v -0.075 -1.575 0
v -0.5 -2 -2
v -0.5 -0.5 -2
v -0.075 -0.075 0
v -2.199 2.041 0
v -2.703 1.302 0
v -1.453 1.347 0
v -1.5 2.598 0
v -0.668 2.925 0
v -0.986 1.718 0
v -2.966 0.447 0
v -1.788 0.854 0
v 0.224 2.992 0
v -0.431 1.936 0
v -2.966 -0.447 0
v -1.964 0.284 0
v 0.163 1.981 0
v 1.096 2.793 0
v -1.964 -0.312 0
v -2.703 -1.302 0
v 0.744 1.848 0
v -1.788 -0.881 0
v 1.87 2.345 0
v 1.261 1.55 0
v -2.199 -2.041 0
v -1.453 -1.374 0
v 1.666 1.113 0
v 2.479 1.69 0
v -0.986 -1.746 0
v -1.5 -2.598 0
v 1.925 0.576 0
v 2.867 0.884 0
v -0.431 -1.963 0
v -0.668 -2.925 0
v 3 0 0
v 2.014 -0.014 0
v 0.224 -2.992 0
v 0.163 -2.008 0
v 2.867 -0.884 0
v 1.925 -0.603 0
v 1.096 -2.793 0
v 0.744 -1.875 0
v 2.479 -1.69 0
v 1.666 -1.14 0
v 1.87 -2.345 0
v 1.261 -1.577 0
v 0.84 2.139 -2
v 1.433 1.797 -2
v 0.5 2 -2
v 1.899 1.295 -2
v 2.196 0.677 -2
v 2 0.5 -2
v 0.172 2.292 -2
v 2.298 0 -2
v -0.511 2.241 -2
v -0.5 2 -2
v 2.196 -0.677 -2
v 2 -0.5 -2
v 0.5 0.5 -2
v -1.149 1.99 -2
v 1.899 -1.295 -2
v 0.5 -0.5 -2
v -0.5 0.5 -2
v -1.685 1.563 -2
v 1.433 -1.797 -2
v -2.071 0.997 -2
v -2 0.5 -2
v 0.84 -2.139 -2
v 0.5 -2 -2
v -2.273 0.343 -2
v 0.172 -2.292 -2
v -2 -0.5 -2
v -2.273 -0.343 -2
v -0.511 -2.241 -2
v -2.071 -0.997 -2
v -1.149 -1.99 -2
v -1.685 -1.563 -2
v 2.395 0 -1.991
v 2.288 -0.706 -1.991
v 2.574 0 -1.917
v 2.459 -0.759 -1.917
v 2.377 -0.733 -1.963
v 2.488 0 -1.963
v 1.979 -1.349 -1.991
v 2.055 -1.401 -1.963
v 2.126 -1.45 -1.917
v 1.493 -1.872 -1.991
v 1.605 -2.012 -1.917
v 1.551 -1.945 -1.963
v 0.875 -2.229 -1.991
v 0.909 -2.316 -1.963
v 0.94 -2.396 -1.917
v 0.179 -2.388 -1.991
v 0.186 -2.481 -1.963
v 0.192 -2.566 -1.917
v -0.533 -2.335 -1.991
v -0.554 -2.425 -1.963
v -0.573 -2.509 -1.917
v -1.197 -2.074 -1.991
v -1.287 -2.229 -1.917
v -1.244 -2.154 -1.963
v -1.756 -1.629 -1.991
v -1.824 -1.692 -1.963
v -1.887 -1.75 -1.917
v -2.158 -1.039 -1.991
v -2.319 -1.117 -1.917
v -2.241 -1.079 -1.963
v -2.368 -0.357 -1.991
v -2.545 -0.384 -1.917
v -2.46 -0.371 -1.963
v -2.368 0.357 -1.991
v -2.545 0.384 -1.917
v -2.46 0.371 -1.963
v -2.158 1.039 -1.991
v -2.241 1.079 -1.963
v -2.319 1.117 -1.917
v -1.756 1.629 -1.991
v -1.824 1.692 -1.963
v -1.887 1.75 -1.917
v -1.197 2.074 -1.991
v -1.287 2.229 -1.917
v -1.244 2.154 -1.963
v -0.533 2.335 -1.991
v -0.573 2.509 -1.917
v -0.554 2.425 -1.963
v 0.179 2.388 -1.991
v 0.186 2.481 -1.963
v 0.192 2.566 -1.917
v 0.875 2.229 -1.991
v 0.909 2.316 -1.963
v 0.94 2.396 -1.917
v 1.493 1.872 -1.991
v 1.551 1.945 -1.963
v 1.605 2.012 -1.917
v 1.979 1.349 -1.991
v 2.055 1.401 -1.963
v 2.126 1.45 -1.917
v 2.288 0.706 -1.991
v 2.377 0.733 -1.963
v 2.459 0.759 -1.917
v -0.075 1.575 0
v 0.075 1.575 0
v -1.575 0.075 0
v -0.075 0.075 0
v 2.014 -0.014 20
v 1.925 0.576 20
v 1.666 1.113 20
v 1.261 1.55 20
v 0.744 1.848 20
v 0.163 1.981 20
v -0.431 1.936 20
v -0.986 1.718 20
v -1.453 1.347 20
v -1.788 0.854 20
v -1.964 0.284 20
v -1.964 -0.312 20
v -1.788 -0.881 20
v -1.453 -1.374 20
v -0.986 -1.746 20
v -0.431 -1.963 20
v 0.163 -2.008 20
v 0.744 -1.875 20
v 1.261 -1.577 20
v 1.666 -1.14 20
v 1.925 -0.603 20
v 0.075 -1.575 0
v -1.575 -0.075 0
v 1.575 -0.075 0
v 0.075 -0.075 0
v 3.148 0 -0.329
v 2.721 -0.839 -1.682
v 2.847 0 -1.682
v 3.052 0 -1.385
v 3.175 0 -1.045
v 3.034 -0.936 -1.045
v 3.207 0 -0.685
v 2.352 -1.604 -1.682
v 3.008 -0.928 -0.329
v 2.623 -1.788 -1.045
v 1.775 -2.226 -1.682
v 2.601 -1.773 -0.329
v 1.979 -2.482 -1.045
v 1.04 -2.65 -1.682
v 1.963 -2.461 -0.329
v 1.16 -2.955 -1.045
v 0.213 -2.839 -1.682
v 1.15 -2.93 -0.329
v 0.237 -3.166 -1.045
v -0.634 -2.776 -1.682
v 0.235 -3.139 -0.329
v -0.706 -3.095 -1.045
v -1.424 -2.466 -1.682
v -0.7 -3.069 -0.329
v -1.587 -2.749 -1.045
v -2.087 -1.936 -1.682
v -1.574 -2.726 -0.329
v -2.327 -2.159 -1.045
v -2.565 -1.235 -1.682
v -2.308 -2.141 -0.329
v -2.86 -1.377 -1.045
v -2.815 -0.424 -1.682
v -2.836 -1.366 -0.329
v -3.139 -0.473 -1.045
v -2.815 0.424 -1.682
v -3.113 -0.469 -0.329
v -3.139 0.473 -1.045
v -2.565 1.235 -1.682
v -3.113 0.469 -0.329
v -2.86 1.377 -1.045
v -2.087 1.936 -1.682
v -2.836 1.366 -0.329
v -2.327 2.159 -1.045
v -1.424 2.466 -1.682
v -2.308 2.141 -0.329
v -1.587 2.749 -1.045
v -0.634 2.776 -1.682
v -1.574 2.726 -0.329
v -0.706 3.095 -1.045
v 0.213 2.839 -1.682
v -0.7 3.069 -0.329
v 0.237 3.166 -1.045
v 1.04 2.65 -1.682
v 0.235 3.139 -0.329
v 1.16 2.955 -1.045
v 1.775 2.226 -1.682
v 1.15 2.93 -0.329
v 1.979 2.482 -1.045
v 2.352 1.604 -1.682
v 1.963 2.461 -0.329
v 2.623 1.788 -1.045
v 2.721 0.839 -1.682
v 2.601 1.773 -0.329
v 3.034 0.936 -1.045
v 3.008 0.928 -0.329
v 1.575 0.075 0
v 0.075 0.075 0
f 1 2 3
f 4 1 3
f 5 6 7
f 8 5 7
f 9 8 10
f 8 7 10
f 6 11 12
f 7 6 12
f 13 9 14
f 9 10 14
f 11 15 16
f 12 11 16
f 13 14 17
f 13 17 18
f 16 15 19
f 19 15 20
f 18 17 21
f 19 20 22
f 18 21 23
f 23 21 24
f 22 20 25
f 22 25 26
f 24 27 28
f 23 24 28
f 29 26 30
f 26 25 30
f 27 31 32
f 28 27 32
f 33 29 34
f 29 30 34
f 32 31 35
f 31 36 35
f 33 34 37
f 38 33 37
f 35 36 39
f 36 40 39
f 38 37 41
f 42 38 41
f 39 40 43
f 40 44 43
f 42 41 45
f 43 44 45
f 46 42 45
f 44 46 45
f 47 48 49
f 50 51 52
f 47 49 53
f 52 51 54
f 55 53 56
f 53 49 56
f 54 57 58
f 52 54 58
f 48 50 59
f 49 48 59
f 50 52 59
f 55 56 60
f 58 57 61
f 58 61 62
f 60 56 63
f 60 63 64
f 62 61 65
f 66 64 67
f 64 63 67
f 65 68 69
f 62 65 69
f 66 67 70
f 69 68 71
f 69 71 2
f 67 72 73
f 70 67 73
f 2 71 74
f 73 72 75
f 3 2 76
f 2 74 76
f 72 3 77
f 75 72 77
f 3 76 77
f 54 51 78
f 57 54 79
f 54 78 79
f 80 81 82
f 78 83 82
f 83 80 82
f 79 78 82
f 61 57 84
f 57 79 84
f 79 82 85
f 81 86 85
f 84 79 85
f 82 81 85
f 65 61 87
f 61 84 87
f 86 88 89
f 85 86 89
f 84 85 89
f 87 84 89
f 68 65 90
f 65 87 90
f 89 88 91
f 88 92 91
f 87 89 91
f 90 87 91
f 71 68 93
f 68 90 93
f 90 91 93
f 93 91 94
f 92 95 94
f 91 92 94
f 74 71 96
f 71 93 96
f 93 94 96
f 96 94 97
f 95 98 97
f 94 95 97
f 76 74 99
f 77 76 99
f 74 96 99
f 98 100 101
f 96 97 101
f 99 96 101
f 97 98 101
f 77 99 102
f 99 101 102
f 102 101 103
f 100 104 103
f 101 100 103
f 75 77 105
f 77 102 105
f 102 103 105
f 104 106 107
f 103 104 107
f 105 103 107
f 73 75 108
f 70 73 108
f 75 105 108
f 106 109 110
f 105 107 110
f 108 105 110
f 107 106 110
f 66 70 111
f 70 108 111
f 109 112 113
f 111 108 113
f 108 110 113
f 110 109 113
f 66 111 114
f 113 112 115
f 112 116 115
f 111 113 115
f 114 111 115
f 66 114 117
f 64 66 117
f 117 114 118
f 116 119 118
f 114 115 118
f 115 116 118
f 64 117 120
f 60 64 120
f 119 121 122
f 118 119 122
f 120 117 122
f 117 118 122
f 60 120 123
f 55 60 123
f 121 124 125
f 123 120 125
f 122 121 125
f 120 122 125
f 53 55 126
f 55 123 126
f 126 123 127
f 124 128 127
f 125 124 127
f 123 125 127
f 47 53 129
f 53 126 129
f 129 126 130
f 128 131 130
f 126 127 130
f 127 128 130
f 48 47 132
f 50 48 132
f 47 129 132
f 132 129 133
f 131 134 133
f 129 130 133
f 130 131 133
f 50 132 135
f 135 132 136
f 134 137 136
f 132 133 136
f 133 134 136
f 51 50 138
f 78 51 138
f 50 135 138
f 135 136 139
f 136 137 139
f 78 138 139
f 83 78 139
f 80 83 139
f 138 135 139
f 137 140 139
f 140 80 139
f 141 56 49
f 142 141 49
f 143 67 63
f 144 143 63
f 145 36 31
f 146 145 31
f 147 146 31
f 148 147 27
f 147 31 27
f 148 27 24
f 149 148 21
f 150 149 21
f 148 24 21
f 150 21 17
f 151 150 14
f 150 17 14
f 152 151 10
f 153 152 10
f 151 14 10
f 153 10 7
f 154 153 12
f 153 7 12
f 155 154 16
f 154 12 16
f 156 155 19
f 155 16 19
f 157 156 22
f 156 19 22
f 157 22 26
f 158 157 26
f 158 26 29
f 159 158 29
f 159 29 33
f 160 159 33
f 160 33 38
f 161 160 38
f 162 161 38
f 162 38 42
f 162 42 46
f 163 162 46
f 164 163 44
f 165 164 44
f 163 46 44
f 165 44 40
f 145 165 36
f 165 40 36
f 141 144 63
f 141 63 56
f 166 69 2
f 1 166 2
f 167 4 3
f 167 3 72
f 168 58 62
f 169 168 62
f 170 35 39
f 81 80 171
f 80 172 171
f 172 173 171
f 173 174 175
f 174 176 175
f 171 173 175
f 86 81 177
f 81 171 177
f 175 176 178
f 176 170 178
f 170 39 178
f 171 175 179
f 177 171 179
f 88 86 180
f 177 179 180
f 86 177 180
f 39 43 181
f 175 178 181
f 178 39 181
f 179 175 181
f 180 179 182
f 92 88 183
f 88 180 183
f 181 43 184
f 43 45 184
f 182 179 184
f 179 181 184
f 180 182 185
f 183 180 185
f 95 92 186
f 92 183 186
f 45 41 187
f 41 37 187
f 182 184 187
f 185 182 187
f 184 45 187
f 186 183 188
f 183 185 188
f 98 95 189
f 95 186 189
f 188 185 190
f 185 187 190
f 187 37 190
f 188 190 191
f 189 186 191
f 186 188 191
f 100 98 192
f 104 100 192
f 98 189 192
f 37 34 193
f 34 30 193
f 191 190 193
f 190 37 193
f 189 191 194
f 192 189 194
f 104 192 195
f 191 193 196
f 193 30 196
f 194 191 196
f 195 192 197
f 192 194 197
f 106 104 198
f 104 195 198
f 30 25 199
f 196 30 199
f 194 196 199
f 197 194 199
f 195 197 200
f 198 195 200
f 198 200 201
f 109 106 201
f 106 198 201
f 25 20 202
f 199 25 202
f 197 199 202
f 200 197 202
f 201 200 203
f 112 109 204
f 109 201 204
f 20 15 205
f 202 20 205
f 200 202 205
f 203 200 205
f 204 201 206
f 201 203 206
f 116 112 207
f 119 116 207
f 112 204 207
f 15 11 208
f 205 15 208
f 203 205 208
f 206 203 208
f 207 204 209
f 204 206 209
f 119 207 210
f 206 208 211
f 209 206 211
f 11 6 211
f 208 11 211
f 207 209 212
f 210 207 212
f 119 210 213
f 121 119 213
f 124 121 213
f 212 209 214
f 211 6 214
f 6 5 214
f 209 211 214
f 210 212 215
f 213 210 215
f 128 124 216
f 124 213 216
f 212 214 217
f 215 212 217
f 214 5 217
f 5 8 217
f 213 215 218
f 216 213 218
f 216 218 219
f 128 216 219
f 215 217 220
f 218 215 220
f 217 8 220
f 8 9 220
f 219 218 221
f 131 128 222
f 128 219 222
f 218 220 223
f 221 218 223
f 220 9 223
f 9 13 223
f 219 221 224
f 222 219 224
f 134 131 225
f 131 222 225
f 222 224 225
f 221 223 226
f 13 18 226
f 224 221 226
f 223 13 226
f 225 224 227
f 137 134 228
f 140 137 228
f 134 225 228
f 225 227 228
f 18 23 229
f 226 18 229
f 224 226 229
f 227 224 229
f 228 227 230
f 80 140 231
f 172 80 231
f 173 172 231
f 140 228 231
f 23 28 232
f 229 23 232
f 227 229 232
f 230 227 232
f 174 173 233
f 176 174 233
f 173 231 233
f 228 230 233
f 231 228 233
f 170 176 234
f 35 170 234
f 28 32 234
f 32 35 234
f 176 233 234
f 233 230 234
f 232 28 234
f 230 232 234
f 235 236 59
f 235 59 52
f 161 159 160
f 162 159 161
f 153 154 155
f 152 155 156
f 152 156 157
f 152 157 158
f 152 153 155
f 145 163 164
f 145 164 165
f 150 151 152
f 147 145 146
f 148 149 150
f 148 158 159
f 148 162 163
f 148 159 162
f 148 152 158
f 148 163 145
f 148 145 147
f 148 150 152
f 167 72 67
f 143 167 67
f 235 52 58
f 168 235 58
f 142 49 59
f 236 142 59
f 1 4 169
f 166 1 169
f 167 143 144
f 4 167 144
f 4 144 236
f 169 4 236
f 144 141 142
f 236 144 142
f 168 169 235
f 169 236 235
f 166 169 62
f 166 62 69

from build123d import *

# Parameters (mm, degrees)
CUT_EXTRUDE1_DEPTH  = 2
CUT_EXTRUDE1_DRAFT  = -12
SKETCH3_R           = 2
BOSS_EXTRUDE1_DEPTH = 20


with BuildPart() as part:
    # Sketch1 → Revolve2 (revolve)
    with BuildSketch(Plane(origin=(0, 0, 0), x_dir=(1, 0, 0), z_dir=(0, 1, 0))):
        with BuildLine():
            Line((0, 0), (0, 2))
            Line((0, 2), (2.298285661, 2))
            ThreePointArc((2.298285661, 2), (2.441964308, 1.978911731), (2.57352322, 1.917425786))
            ThreePointArc((2.57352322, 1.917425786), (3.174697589, 1.044998208), (3, 0))
            Line((3, 0), (0, 0))
        make_face()
    revolve(axis=Axis((0, 0, -0.65925001), (0, 0, -1)))


with BuildPart() as cut_extrude1_tool:
    # Sketch2 → Cut-Extrude1 (with draft: the straight prism first)
    with BuildSketch(Plane(origin=(0, 0, -2), x_dir=(-1, 0, 0), z_dir=(0, 0, -1))):
        Polygon((0.5, -0.5), (2, -0.5), (2, 0.5), (0.5, 0.5), (0.5, 2), (-0.5, 2), (-0.5, 0.5), (-2, 0.5), (-2, -0.5), (-0.5, -0.5), (-0.5, -2), (0.5, -2), align=None)
    extrude(amount=-CUT_EXTRUDE1_DEPTH)
    # Cut-Extrude1: the draft: its side faces are tilted about the plane it starts from
    cut_extrude1_sides = [cut_extrude1_tool.faces().sort_by_distance(p)[0] for p in [
        (-1.25, -0.5, -1),
        (-2, 0, -1),
        (-1.25, 0.5, -1),
        (-0.5, 1.25, -1),
        (0, 2, -1),
        (0.5, 1.25, -1),
        (1.25, 0.5, -1),
        (2, 0, -1),
        (1.25, -0.5, -1),
        (0.5, -1.25, -1),
        (0, -2, -1),
        (-0.5, -1.25, -1),
    ]]
    draft(cut_extrude1_sides, Plane(origin=(0, 0, -2), x_dir=(-1, 0, 0), z_dir=(0, 0, -1)), CUT_EXTRUDE1_DRAFT)


with BuildPart() as part_1:
    add(part.part)

    # Cut-Extrude1: cut by cut_extrude1_tool
    add(cut_extrude1_tool.part, mode=Mode.SUBTRACT)

    # Sketch3 → Boss-Extrude1 (add)
    with BuildSketch(Plane.XY):
        with Locations((0.013589602, -0.013589602)):
            Circle(SKETCH3_R)
    extrude(amount=BOSS_EXTRUDE1_DEPTH)


solid = part_1.part
